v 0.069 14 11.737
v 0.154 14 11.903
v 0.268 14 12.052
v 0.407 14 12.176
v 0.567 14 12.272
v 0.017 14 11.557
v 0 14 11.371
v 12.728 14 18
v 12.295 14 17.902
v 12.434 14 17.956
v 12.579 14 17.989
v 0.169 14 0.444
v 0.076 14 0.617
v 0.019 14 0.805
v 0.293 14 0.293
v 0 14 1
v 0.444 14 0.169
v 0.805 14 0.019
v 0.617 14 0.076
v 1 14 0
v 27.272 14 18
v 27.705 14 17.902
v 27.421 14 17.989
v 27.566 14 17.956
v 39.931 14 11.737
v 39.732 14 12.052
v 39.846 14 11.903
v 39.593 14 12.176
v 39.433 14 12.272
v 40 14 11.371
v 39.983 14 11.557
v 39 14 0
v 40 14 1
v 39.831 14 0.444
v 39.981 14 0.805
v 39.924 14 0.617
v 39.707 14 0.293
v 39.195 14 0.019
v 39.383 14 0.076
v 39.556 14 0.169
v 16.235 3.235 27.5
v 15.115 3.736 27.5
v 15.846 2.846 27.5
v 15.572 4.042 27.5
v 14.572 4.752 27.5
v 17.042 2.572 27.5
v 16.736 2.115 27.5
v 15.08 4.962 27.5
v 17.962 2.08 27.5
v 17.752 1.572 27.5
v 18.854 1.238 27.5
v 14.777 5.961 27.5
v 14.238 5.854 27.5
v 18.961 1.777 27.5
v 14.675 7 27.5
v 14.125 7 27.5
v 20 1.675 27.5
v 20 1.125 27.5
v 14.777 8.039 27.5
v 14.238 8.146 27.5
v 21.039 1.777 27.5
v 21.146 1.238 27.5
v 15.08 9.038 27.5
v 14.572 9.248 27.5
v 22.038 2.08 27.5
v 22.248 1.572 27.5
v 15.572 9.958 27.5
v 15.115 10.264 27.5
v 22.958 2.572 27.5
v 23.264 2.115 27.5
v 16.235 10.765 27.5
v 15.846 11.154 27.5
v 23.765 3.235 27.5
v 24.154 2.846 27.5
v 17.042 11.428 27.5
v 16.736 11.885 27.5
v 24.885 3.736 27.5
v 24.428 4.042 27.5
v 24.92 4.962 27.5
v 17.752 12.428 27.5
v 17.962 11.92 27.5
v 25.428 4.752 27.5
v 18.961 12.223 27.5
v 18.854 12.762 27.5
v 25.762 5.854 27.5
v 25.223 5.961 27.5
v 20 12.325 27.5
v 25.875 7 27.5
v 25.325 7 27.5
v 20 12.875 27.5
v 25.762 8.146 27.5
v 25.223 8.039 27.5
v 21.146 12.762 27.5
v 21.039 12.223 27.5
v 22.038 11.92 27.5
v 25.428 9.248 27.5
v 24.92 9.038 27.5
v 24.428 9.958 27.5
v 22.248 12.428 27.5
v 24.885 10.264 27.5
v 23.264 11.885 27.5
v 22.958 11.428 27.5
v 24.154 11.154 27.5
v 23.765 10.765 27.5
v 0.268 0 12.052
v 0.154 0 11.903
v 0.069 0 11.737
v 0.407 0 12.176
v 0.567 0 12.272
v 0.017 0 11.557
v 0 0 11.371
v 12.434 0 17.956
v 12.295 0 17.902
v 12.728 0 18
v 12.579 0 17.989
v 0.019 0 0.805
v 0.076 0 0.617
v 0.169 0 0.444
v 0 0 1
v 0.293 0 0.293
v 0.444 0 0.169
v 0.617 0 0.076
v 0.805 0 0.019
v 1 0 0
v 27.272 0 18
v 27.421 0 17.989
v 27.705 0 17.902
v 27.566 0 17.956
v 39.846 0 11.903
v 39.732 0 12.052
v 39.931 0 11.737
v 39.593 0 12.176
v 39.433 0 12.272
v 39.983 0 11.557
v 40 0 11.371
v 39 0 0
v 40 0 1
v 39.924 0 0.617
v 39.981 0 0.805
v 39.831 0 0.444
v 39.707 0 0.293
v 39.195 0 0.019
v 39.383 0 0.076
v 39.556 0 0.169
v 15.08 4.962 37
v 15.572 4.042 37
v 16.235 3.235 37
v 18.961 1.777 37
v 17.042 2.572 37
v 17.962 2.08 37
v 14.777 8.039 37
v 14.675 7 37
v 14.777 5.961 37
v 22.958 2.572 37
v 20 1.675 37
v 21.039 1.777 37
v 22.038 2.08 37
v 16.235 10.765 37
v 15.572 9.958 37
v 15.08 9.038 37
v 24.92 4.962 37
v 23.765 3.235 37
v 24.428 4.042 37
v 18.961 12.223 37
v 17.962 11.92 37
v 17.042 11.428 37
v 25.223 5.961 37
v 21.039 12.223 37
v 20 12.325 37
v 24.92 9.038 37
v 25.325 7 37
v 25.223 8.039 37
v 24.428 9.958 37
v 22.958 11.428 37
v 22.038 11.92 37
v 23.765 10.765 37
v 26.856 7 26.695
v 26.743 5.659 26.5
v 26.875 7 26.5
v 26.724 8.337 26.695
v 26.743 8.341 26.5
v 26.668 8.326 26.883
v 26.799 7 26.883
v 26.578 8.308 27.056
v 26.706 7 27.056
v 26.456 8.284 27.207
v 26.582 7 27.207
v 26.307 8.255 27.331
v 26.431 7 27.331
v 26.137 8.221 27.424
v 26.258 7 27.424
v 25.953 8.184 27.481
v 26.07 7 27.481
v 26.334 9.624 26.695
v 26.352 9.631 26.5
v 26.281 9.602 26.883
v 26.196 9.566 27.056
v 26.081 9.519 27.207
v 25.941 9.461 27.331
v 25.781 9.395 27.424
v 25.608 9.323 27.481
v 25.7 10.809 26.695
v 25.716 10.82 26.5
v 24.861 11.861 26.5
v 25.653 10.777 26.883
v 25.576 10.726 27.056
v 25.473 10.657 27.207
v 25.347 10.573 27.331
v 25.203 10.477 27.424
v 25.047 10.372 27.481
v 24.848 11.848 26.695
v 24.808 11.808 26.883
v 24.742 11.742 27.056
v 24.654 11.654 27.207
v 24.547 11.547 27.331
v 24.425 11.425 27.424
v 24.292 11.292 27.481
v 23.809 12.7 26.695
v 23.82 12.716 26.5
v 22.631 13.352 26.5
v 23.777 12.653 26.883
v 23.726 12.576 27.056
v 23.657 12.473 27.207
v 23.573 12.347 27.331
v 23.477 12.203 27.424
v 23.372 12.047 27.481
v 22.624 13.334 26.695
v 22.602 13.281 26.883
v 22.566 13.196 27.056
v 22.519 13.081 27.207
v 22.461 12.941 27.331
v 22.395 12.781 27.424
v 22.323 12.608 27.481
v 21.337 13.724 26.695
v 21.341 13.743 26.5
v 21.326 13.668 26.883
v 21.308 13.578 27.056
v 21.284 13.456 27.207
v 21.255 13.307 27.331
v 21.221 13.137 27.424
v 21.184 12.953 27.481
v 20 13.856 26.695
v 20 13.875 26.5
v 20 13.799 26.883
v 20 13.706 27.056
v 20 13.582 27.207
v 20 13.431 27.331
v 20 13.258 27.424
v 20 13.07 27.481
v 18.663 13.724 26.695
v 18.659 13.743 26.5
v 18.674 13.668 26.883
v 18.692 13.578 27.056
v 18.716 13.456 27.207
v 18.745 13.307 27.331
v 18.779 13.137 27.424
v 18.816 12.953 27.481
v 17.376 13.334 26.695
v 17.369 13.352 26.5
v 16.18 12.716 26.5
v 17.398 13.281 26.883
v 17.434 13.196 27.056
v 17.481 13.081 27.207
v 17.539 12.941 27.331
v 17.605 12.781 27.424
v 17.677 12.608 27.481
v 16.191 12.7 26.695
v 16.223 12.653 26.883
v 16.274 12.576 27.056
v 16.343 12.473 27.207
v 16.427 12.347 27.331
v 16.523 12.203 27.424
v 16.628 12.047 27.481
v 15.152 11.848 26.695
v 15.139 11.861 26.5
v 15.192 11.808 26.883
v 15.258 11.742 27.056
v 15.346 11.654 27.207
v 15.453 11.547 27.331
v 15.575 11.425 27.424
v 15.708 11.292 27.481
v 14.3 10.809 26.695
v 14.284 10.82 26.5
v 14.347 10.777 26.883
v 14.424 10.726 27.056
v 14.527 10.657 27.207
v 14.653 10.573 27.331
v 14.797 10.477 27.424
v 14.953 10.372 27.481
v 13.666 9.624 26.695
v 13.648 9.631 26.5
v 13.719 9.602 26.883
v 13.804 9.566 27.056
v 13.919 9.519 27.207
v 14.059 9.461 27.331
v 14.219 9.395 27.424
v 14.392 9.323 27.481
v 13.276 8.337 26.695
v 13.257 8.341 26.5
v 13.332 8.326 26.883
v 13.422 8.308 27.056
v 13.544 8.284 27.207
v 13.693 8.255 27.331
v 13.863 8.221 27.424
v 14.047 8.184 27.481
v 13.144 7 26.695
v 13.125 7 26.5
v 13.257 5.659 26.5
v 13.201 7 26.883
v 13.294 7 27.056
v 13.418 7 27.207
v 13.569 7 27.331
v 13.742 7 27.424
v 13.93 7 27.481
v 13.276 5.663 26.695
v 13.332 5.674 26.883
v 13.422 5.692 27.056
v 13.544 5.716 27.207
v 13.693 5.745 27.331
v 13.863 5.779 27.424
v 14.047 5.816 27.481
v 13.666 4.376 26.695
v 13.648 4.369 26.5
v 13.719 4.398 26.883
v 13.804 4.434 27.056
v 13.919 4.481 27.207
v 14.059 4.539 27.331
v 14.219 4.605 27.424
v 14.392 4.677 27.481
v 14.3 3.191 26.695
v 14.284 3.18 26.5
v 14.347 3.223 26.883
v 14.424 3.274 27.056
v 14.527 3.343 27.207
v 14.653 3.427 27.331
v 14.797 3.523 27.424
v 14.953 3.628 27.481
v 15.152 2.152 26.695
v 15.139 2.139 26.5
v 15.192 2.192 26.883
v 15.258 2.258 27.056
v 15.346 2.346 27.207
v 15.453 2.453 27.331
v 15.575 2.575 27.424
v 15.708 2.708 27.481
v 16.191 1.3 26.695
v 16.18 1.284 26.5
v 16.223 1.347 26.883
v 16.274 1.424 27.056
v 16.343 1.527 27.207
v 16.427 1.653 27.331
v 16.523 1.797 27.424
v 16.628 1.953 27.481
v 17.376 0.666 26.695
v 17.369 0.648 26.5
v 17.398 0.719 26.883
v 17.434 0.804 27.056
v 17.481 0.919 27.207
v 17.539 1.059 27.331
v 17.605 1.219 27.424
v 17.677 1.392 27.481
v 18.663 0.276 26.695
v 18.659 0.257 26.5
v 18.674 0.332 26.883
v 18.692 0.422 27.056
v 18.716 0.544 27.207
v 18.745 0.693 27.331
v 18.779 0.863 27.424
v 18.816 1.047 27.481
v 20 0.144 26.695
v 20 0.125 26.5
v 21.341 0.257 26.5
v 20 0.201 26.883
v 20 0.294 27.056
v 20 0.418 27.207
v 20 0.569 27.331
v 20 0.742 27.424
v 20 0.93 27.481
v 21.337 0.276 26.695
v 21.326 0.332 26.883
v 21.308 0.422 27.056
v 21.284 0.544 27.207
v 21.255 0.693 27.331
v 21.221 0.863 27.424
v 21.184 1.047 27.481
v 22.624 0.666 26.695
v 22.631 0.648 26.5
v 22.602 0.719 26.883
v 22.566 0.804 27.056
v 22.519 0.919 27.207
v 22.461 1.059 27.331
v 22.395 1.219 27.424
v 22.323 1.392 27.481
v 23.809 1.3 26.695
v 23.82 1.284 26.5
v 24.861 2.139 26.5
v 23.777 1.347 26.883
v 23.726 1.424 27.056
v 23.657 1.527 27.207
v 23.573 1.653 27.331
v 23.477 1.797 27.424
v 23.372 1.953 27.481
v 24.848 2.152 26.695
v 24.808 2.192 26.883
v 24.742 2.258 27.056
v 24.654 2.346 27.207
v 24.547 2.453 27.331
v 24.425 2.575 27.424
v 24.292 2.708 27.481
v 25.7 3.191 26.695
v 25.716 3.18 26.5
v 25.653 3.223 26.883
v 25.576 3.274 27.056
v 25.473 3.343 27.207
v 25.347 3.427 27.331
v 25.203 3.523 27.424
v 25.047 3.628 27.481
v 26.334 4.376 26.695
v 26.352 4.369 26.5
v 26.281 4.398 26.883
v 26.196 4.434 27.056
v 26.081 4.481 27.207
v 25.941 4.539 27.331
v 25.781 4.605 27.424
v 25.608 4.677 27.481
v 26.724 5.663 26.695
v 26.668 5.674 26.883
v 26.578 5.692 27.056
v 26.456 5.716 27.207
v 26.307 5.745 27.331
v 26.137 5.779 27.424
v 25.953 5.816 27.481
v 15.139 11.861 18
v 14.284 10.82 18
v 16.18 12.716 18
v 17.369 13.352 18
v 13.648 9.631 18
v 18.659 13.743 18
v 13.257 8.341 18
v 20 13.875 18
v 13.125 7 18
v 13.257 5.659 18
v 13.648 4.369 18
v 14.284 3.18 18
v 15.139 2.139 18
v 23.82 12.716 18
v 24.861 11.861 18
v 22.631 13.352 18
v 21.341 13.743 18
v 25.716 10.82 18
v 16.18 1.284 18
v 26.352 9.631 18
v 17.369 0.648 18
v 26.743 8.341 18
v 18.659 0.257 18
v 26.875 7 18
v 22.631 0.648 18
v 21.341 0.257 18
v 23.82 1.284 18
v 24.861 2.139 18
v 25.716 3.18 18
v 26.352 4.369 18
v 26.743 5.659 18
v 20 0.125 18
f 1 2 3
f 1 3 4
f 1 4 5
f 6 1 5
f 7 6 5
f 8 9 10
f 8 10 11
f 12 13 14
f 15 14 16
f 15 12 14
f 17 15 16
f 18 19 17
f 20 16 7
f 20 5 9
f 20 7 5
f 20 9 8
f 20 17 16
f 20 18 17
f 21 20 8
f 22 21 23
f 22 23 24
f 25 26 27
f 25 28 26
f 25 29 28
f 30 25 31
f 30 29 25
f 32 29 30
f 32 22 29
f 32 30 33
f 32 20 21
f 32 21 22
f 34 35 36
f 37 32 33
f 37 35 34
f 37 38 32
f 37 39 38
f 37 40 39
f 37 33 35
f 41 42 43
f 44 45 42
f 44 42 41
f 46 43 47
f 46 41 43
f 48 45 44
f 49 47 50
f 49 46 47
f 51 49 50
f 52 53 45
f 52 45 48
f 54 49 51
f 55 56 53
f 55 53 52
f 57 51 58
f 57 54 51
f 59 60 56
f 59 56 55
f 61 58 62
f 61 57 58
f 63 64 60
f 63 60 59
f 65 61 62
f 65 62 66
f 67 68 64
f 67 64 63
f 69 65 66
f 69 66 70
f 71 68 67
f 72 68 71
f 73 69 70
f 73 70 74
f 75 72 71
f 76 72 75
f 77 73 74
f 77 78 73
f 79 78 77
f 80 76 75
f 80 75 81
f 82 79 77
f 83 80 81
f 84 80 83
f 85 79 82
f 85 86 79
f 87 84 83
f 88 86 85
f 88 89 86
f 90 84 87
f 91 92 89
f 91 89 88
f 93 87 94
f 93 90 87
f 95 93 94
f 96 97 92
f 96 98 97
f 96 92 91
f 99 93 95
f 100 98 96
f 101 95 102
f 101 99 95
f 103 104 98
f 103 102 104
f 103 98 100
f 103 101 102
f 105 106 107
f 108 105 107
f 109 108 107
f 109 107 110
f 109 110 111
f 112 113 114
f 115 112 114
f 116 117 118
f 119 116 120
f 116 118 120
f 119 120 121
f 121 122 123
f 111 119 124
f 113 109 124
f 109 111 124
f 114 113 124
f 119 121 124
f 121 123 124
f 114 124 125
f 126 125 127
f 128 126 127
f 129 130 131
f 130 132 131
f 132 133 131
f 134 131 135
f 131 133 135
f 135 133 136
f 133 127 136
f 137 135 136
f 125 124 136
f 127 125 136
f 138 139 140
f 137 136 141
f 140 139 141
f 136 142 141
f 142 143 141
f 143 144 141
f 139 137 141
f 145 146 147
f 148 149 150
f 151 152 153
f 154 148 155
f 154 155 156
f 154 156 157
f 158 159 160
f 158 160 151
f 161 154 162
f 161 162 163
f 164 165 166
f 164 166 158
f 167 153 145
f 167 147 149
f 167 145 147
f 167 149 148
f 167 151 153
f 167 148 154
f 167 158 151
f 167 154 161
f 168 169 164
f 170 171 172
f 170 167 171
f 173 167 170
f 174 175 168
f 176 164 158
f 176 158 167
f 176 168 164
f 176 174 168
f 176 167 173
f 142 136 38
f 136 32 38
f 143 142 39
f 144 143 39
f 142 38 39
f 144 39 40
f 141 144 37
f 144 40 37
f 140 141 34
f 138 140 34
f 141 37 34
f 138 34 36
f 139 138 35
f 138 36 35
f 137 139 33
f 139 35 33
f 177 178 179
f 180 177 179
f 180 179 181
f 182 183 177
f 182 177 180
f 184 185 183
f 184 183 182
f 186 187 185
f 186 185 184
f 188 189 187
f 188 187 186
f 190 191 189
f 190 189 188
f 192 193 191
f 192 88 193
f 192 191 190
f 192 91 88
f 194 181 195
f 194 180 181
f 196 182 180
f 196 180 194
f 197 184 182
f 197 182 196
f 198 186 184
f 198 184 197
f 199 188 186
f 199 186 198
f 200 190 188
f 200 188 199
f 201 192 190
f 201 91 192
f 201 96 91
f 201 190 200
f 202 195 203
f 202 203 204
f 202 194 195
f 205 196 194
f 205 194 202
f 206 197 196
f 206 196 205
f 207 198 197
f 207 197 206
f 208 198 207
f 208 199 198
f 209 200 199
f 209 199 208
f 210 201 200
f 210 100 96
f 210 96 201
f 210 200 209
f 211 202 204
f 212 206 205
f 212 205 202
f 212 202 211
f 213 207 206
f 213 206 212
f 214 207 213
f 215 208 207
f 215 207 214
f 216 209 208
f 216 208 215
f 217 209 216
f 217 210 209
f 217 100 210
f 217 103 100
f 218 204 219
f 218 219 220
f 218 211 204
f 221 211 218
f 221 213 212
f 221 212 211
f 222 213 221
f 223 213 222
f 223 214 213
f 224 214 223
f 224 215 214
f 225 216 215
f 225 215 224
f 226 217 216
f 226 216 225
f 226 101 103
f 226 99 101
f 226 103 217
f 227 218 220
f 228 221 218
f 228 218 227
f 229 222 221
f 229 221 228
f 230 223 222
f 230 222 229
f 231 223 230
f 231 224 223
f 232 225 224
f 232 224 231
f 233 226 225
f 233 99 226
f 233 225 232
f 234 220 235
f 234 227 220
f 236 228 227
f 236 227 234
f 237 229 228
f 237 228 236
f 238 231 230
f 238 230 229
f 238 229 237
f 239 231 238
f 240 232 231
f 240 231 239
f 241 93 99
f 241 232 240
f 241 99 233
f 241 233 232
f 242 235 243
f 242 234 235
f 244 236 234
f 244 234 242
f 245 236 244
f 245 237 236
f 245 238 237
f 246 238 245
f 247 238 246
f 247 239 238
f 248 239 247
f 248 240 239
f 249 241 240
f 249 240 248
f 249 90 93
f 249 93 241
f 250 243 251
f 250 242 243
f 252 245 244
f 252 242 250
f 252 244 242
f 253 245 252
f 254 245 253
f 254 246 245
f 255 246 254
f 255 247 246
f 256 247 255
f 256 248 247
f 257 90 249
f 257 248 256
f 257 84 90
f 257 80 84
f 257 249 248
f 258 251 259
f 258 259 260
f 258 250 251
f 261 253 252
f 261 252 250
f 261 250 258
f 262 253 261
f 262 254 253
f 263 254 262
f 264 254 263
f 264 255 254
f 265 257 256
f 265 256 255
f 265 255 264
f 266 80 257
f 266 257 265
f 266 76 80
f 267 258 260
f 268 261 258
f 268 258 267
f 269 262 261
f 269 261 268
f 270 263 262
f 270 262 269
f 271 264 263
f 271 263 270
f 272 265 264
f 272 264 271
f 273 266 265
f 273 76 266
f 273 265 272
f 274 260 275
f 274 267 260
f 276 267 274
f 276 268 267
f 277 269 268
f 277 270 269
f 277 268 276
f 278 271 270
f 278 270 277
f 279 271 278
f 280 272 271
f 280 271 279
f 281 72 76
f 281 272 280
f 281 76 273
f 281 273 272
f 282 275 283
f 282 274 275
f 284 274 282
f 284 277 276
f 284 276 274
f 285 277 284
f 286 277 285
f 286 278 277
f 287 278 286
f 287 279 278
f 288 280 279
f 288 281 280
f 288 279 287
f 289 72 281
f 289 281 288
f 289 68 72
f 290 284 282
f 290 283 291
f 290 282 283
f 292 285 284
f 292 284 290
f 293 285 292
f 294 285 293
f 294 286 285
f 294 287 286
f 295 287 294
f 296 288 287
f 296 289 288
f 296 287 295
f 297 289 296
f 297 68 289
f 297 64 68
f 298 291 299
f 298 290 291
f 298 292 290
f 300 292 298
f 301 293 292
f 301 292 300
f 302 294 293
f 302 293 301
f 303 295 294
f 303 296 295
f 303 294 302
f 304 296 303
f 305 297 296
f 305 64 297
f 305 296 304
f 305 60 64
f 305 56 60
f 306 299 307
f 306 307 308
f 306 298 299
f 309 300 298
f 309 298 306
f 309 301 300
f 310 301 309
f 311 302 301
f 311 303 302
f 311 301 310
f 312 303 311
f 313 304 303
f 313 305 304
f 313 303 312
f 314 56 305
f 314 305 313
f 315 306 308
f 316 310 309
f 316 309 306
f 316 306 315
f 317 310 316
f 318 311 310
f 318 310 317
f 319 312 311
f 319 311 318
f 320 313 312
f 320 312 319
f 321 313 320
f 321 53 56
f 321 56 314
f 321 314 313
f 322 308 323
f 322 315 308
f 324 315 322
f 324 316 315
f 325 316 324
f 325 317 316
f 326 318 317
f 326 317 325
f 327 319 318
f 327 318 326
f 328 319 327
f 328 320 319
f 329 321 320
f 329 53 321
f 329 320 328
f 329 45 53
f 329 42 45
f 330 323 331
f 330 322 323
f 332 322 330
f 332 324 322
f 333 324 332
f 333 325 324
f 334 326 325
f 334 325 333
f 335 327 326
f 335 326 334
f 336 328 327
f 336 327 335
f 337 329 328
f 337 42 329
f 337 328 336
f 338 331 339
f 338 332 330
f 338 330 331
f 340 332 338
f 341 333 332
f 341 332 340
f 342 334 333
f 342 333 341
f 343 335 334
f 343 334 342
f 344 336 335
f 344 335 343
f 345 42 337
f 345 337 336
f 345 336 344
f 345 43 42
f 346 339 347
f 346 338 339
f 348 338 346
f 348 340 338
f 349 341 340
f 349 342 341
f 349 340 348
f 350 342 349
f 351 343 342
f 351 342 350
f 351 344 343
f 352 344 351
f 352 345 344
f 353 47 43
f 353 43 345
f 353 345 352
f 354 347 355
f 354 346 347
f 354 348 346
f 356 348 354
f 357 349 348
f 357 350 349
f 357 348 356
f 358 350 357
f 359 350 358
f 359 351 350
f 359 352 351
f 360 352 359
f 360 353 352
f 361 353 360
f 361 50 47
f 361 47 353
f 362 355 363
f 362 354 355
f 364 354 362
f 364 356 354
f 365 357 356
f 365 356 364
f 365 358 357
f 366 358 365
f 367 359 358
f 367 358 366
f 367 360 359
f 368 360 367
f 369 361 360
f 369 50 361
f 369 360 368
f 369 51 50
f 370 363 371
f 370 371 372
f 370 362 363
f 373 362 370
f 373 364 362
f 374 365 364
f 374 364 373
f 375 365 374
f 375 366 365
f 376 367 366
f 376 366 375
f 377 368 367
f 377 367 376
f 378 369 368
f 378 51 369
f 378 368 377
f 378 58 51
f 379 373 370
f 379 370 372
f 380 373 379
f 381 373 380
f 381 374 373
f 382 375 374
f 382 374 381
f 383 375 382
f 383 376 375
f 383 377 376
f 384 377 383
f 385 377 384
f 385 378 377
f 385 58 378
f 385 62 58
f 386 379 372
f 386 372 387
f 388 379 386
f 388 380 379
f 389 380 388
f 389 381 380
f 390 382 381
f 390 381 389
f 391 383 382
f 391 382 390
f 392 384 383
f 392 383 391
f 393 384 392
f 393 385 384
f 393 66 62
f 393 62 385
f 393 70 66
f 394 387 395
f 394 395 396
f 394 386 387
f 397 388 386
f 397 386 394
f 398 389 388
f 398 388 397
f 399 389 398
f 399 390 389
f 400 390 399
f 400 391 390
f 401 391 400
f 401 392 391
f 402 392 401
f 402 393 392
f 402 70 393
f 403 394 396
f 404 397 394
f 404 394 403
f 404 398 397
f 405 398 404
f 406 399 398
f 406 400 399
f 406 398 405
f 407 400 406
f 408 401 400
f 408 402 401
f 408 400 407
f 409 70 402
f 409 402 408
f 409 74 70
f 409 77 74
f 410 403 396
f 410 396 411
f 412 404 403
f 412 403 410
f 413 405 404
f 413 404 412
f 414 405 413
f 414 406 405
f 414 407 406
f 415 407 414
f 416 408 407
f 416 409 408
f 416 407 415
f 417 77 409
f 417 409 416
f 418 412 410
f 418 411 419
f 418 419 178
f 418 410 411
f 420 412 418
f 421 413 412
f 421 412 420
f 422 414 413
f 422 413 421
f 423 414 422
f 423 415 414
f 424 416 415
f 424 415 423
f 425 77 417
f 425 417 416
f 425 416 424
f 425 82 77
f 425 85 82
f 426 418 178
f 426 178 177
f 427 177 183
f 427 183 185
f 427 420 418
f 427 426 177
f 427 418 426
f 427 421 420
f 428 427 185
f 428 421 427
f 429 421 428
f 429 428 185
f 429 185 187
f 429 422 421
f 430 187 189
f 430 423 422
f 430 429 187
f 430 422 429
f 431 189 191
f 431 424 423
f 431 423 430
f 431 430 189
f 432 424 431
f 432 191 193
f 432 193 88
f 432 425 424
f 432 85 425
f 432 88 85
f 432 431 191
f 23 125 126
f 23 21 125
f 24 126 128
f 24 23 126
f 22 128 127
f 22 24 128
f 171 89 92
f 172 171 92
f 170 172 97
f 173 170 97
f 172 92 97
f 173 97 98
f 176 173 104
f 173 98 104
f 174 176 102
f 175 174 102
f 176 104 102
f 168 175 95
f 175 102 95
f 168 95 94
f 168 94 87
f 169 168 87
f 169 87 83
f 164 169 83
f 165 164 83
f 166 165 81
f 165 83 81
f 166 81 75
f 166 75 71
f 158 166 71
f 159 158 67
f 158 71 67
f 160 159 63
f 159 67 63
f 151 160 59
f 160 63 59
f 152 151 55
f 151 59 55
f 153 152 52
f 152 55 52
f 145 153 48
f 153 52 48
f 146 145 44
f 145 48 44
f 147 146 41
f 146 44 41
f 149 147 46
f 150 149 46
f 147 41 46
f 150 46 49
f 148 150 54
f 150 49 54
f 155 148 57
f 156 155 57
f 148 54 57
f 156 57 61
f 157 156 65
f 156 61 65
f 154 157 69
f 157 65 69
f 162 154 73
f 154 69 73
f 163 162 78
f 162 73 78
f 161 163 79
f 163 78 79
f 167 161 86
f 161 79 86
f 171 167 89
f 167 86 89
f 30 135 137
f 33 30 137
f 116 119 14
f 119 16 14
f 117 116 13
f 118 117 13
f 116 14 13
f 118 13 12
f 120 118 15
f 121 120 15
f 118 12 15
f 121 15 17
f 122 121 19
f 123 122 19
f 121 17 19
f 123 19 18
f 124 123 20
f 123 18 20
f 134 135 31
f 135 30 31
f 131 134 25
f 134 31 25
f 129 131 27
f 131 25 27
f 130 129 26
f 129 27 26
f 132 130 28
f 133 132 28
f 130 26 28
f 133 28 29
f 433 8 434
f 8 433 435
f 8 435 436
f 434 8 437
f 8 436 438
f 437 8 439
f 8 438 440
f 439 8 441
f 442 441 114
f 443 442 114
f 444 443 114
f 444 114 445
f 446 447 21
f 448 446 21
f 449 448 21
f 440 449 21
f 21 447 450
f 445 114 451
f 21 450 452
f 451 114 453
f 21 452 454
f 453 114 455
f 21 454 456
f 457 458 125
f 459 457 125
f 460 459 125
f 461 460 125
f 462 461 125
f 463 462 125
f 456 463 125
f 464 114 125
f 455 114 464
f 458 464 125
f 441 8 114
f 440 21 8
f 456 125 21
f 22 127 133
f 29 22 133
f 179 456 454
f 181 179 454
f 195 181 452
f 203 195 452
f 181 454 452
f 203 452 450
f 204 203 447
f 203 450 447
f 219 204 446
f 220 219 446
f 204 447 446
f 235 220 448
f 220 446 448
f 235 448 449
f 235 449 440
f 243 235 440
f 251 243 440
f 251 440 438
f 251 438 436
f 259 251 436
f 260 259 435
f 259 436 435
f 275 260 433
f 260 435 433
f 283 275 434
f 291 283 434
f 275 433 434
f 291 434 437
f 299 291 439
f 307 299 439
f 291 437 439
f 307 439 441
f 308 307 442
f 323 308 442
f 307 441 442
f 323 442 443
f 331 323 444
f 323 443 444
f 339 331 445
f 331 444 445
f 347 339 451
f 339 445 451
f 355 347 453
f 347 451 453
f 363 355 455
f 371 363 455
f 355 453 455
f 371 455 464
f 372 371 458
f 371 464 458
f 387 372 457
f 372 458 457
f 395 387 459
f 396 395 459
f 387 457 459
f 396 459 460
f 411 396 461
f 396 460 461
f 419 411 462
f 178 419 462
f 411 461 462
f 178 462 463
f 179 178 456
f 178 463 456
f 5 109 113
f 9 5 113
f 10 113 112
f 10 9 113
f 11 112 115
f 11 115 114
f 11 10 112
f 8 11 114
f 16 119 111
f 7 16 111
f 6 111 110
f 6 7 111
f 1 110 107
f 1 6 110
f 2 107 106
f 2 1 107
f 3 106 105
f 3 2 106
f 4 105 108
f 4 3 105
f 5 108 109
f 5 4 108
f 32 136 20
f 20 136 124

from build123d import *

# Parameters (mm, degrees)
BOSS_EXTRUDE1_DEPTH = 14
SKETCH2_R           = 6.875
BOSS_EXTRUDE2_DEPTH = 9.5
SKETCH3_R           = 5.325
BOSS_EXTRUDE3_DEPTH = 9.5
FILLET1_R           = 1


with BuildPart() as part:
    # Sketch1 → Boss-Extrude1 (new body)
    with BuildSketch(Plane(origin=(0, 0, 0), x_dir=(1, 0, 0), z_dir=(0, 1, 0))):
        Polygon((0, 0), (0, -12), (12.5, -18), (27.5, -18), (40, -12), (40, 0), align=None)
    extrude(amount=BOSS_EXTRUDE1_DEPTH)

    # Sketch2 → Boss-Extrude2 (add)
    with BuildSketch(Plane.XY.offset(18)):
        with Locations((20, 7)):
            Circle(SKETCH2_R)
    extrude(amount=BOSS_EXTRUDE2_DEPTH)

    # Sketch3 → Boss-Extrude3 (add)
    with BuildSketch(Plane.XY.offset(27.5)):
        with Locations((20, 7)):
            Circle(SKETCH3_R)
    extrude(amount=BOSS_EXTRUDE3_DEPTH)

    # Fillet1
    fillet1_edges = [part.edges().sort_by_distance(p)[0] for p in [
        (0, 7, 0),
        (40, 7, 0),
        (40, 7, 12),
        (27.5, 7, 18),
        (12.5, 7, 18),
        (0, 7, 12),
        (13.125, 7, 27.5),
    ]]
    fillet(fillet1_edges, radius=FILLET1_R)


solid = part.part
